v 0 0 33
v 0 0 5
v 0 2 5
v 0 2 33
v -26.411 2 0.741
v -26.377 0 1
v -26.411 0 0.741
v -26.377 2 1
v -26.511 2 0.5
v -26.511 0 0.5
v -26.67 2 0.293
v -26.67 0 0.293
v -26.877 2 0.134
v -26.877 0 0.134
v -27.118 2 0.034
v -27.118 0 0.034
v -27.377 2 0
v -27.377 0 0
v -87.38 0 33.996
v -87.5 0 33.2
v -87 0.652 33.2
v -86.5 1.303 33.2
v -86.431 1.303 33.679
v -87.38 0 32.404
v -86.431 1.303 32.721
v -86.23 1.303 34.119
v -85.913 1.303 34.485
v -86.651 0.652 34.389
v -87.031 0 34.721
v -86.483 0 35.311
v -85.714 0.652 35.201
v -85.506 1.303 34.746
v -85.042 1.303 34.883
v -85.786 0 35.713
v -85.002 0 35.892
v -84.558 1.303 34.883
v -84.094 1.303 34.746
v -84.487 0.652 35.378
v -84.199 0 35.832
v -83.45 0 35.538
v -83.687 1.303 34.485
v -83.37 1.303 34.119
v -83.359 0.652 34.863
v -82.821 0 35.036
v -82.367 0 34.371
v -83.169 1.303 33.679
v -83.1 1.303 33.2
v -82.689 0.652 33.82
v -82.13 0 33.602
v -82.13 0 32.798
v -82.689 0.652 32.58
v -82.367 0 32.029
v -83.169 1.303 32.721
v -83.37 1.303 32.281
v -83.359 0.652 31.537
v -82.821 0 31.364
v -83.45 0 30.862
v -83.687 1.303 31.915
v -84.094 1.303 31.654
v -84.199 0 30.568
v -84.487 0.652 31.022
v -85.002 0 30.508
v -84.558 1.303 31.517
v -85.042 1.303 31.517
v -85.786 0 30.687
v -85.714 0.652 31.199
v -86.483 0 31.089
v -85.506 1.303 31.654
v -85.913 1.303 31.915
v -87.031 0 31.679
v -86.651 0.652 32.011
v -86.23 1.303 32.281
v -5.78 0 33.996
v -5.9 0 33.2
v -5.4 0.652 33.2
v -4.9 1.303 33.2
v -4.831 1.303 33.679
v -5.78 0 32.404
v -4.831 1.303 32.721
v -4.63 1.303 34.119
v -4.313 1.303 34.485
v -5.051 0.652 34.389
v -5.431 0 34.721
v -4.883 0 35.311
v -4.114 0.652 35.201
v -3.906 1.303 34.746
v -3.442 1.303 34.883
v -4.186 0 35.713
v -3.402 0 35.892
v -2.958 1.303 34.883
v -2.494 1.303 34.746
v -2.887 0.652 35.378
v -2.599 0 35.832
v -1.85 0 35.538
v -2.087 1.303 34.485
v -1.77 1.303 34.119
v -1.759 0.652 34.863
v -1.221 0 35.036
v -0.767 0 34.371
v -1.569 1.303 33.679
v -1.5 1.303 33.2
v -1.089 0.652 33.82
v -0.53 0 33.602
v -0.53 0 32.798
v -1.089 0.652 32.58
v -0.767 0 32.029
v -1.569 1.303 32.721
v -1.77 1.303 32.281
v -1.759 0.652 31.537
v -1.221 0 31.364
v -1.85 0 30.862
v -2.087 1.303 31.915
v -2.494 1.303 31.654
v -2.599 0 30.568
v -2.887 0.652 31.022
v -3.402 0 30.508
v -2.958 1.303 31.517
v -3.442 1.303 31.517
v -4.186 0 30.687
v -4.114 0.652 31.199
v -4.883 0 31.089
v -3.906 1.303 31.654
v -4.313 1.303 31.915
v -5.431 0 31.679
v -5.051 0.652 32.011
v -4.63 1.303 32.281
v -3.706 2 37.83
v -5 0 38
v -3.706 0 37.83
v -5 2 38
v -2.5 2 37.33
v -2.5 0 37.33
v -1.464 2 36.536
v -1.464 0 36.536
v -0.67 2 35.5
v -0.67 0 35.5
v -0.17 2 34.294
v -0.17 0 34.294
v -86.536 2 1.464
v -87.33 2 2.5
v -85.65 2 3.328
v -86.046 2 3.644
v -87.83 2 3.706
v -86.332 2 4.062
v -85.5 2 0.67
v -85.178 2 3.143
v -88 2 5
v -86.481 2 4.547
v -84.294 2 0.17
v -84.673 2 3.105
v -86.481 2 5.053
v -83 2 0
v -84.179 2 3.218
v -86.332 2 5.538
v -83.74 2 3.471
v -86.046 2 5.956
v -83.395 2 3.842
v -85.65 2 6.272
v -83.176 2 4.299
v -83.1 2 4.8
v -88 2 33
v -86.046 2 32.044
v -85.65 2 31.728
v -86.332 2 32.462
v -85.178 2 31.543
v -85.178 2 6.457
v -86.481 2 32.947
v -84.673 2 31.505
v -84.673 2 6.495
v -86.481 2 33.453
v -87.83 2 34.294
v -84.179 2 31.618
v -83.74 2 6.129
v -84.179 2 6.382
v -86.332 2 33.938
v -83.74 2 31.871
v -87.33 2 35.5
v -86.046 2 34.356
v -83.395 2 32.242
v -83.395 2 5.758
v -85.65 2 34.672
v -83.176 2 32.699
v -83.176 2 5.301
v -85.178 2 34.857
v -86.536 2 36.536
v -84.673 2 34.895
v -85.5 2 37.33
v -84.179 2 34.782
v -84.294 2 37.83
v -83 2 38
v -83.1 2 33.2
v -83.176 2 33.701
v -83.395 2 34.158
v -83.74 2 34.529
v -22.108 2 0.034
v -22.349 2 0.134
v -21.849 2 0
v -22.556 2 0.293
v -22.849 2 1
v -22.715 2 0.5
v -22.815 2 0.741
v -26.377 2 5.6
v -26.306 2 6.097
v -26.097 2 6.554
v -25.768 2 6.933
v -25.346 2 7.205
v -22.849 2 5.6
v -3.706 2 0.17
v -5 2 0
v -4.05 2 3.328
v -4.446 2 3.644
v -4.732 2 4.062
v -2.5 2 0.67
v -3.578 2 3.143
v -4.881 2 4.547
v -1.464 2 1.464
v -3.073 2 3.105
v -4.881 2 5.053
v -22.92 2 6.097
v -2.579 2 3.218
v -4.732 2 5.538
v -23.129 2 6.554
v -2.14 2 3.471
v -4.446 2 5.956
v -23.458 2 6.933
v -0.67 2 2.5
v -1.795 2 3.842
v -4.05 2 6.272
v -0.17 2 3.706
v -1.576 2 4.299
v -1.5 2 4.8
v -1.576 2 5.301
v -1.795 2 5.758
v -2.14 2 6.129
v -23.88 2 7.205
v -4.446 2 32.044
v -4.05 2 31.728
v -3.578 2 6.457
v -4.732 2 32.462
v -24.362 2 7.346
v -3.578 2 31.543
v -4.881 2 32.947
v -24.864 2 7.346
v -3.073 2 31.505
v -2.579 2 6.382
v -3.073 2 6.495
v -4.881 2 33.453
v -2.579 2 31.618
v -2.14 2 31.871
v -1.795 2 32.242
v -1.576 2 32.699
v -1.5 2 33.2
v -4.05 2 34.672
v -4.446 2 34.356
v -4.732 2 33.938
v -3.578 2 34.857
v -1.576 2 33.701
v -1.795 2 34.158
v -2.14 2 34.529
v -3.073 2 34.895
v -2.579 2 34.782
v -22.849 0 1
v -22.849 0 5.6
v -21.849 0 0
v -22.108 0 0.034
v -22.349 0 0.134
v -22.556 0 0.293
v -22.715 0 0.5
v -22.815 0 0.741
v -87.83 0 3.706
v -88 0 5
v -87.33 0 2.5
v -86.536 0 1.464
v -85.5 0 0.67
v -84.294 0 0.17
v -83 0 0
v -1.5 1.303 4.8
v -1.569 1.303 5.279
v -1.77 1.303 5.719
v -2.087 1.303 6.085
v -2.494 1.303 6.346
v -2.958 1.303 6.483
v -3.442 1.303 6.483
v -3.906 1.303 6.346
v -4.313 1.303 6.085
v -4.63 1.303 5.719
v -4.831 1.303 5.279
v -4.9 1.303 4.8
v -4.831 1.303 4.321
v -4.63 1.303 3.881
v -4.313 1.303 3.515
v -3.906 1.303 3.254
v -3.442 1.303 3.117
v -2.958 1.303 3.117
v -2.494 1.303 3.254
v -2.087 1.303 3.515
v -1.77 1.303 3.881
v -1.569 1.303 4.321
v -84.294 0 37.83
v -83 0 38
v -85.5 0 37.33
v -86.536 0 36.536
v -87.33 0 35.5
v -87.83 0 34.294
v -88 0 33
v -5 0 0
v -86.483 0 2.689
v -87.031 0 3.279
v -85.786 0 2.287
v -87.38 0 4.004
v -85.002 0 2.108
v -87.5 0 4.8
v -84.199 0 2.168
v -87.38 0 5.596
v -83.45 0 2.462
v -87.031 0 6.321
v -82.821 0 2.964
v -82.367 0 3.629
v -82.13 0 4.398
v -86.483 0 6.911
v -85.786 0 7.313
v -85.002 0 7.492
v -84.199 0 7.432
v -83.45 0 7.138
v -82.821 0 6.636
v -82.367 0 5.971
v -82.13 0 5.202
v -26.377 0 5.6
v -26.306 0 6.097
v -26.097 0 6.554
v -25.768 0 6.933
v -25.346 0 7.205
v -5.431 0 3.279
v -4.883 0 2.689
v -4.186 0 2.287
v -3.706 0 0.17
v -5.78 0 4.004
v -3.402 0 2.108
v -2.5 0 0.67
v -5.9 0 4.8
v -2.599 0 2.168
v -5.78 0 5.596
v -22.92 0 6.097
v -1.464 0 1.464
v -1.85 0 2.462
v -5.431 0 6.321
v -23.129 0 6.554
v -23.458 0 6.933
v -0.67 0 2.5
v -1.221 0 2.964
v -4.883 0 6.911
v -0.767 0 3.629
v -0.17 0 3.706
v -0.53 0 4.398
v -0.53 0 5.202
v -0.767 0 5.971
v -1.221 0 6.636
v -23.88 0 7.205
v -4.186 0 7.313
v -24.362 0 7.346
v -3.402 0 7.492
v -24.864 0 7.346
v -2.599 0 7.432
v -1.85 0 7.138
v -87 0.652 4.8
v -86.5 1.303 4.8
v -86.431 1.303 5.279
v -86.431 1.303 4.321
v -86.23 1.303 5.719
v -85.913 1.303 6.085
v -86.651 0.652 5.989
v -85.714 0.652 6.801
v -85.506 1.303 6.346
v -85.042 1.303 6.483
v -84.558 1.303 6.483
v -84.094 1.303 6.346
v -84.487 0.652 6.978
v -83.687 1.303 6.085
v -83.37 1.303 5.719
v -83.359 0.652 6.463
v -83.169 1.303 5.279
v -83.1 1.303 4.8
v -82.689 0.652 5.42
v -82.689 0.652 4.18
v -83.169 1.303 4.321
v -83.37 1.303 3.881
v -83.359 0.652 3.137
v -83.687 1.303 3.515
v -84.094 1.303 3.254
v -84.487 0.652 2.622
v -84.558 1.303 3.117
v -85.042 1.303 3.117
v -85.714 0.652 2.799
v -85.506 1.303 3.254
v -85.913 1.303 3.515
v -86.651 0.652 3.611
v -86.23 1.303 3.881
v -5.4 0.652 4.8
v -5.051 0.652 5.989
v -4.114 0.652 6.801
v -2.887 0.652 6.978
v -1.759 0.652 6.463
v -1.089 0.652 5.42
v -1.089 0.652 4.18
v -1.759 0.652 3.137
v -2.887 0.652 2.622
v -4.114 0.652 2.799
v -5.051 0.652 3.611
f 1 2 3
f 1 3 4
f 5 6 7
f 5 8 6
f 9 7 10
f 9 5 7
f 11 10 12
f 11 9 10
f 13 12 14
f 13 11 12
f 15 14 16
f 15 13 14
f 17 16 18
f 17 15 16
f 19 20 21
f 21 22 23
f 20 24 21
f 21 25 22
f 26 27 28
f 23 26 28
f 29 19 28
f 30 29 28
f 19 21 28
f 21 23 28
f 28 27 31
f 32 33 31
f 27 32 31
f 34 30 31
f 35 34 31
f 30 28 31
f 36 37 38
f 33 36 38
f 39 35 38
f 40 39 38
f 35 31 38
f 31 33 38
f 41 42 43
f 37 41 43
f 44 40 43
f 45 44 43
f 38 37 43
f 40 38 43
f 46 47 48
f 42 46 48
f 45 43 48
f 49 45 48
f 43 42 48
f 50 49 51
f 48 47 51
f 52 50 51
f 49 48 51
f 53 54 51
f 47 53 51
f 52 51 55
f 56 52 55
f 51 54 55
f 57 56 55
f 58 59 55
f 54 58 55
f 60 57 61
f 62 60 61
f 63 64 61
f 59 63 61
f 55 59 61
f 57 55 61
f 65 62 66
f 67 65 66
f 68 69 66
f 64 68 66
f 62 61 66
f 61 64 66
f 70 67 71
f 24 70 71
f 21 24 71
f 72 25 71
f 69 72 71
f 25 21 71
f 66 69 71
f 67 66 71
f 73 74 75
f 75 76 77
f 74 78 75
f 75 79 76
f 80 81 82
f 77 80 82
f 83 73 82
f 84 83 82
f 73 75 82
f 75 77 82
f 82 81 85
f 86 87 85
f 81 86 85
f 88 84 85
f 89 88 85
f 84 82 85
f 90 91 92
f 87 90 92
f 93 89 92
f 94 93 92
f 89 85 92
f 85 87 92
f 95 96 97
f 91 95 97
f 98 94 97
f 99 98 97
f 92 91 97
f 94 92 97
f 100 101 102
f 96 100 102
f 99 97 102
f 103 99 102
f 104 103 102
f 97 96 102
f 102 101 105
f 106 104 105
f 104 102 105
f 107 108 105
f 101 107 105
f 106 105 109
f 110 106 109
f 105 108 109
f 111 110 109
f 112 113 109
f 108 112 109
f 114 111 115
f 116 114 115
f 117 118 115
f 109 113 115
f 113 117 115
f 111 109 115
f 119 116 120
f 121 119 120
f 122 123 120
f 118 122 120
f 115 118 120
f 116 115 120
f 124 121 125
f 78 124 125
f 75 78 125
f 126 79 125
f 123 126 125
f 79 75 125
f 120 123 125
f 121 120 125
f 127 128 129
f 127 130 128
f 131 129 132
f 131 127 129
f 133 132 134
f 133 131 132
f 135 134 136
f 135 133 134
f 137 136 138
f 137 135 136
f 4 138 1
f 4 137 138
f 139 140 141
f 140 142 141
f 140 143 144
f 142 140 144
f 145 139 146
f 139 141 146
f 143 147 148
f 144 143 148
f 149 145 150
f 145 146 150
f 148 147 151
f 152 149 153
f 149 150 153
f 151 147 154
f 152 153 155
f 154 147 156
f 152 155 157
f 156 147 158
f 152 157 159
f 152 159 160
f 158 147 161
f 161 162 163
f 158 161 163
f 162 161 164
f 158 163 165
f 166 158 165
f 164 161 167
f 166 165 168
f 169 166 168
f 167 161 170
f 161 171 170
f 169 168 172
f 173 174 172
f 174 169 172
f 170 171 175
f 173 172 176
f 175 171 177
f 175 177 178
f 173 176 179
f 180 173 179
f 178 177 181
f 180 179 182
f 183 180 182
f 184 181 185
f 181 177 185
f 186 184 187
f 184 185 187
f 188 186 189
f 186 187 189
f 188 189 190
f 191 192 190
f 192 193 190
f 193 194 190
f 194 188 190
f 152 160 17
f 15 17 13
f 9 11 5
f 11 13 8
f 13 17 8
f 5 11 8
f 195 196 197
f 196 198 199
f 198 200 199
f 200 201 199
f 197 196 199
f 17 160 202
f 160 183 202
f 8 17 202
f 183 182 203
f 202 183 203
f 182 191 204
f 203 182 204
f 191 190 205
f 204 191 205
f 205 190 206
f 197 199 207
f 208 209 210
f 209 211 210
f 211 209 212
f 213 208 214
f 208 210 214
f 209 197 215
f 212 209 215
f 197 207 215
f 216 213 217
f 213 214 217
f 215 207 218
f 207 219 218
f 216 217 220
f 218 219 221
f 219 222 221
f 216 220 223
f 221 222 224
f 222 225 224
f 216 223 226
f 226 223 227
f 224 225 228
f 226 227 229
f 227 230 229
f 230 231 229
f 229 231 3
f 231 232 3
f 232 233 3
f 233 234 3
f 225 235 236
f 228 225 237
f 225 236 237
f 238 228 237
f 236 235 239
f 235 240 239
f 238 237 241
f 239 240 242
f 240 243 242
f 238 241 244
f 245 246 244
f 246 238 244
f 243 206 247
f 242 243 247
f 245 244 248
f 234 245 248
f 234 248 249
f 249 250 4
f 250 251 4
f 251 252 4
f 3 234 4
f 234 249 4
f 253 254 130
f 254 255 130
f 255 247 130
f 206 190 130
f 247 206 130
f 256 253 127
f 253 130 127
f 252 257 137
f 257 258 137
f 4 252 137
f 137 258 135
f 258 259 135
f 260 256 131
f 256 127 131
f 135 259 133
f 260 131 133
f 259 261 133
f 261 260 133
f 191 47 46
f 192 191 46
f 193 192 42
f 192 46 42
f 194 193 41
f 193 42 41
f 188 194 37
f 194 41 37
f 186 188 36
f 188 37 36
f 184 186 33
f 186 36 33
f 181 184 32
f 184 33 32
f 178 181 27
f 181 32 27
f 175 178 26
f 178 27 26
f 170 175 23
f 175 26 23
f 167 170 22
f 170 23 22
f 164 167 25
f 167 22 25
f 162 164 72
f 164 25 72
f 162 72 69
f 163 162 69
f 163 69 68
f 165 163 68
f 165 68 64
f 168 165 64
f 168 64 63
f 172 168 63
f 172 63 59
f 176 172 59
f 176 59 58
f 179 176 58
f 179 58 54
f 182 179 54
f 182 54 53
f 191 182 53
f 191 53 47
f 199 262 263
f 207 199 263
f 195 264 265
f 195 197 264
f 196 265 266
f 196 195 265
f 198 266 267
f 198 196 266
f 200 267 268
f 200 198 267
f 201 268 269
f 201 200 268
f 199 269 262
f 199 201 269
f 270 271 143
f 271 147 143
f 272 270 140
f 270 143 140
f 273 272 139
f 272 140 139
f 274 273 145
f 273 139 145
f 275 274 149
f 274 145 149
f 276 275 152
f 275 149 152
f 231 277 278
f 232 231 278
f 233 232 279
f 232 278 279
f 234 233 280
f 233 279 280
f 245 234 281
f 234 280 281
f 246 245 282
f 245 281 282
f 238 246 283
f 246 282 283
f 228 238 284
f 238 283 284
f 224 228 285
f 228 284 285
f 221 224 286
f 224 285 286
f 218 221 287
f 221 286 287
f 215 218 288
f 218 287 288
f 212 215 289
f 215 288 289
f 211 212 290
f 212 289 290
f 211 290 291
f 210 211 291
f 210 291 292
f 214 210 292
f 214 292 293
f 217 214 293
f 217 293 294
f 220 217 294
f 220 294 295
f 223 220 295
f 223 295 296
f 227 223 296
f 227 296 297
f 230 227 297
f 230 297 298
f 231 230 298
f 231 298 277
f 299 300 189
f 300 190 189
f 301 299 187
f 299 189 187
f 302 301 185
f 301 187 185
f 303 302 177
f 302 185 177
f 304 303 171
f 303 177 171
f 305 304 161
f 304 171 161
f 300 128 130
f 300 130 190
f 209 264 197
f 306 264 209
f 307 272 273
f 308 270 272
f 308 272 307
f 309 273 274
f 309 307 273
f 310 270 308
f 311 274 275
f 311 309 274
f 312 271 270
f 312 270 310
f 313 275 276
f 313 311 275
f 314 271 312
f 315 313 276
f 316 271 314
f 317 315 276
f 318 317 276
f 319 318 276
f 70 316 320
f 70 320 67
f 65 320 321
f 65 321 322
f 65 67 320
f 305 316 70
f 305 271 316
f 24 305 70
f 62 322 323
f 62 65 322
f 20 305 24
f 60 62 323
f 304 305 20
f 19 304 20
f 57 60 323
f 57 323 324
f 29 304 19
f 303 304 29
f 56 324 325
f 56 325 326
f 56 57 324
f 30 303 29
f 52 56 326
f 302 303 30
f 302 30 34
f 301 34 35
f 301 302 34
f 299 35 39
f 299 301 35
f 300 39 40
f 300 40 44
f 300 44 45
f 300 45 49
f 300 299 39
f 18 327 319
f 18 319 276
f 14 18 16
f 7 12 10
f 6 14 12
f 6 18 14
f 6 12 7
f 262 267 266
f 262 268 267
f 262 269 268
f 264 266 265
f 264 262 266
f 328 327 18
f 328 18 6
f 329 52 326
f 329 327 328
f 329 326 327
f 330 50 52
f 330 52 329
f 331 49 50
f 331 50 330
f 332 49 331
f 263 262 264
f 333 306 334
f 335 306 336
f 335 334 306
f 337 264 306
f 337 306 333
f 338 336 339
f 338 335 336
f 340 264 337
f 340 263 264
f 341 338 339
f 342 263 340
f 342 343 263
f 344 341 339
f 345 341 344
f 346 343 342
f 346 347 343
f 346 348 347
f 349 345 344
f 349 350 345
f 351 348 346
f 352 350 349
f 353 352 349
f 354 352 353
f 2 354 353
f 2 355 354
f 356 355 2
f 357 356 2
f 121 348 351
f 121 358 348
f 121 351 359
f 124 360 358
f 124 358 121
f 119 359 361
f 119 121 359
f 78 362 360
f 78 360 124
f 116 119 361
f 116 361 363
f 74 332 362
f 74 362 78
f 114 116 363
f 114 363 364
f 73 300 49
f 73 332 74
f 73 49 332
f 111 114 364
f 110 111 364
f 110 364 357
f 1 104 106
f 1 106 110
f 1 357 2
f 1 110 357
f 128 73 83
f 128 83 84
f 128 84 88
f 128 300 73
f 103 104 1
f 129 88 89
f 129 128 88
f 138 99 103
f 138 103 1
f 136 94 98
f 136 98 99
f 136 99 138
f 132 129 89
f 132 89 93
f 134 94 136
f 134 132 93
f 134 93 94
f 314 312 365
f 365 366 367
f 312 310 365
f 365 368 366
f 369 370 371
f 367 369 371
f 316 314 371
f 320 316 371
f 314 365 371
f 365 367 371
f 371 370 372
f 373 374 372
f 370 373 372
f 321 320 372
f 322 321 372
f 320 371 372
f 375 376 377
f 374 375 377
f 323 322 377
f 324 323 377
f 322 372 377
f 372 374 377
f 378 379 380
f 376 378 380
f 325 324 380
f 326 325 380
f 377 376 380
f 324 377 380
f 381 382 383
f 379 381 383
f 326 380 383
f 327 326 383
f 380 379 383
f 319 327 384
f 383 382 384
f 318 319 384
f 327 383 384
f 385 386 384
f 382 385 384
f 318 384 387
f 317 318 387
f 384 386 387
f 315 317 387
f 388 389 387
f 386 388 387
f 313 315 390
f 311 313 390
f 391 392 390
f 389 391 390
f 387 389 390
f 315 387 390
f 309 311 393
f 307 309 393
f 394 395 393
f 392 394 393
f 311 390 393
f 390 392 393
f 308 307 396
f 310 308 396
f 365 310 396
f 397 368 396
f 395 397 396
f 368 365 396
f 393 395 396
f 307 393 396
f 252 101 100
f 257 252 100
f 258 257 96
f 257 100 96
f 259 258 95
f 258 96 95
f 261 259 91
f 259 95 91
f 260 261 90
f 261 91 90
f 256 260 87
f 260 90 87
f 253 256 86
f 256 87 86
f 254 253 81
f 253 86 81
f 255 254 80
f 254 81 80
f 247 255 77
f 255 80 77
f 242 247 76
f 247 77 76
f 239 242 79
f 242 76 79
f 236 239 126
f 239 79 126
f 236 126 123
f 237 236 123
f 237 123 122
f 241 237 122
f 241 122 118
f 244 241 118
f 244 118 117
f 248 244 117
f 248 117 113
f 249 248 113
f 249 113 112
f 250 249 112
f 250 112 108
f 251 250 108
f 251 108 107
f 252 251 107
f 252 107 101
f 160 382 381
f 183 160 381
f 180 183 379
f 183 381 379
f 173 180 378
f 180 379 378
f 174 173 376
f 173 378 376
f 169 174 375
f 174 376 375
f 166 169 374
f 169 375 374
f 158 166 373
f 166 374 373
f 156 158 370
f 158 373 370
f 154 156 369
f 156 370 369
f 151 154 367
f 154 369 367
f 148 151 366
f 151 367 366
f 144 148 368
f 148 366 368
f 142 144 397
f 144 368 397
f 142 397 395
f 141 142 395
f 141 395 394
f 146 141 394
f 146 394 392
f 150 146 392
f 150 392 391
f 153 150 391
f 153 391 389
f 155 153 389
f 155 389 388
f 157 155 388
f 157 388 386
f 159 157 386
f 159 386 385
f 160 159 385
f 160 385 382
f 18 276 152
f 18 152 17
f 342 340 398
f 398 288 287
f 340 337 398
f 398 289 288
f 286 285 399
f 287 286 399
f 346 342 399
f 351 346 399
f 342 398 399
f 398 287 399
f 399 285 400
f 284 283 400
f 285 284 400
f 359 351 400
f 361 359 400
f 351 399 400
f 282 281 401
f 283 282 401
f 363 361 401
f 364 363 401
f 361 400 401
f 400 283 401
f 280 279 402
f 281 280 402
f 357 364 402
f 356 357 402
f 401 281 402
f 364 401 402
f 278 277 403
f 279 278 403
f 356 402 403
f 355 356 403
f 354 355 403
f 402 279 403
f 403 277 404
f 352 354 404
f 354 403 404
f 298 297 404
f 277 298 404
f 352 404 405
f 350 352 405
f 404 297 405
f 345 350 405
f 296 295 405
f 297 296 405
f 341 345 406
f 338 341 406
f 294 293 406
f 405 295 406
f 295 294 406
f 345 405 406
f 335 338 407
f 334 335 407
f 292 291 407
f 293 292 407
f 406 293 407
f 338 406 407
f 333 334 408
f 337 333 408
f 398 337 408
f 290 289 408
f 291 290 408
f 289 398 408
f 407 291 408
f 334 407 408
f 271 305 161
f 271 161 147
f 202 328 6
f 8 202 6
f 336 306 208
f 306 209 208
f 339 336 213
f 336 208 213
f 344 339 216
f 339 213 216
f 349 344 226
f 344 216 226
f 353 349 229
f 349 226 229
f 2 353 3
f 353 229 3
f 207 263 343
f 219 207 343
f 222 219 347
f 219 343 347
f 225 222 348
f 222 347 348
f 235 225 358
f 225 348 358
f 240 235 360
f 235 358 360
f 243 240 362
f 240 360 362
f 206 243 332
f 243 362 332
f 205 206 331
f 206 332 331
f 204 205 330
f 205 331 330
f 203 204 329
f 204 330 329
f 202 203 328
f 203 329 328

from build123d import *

# Parameters (mm, degrees)
F0_R           = 1.7
F1_DEPTH       = 2
F2_R           = 5
F3_D           = 3
F3_DEPTH       = 13.5
F3_CSINK_D     = 5.4
F3_CSINK_ANGLE = 75
F4_DEPTH       = 25
F5_R           = 1


with BuildPart() as f1:
    # F0 (on Front) → F1 (new body)
    with BuildSketch(Plane.XZ):
        with BuildLine():
            Line((0, 38), (-88, 38))
            Line((-88, 38), (-88, 0))
            Line((-88, 0), (-26.377132, 0))
            Line((-26.377132, 0), (-26.377132, 5.6))
            ThreePointArc((-26.377132, 5.6), (-24.613067, 7.364066), (-22.849001, 5.6))
            Line((-22.849001, 5.6), (-22.849001, 0))
            Line((-22.849001, 0), (0, 0))
            Line((0, 0), (0, 38))
        make_face()
        with Locations((-84.8, 4.8)):
            Circle(F0_R, mode=Mode.SUBTRACT)
        with Locations((-3.2, 4.8)):
            Circle(F0_R, mode=Mode.SUBTRACT)
        with Locations((-84.8, 33.2)):
            Circle(F0_R, mode=Mode.SUBTRACT)
        with Locations((-3.2, 33.2)):
            Circle(F0_R, mode=Mode.SUBTRACT)
        with BuildLine():
            Line((-26.377132, 5.6), (-26.377132, 0))
            Line((-26.377132, 0), (-22.849001, 0))
            Line((-22.849001, 0), (-22.849001, 5.6))
            ThreePointArc((-22.849001, 5.6), (-24.613067, 7.364066), (-26.377132, 5.6))
        make_face()
    extrude(amount=-F1_DEPTH)

    # F2
    f2_edges = [f1.edges().sort_by_distance(p)[0] for p in [
        (-88, 1, 38),
        (-88, 1, 0),
        (0, 1, 0),
        (0, 1, 38),
    ]]
    fillet(f2_edges, radius=F2_R)

    # F3
    with Locations(Plane.XZ):
        with Locations((-84.8, 4.8), (-84.8, 33.2), (-3.2, 4.8), (-3.2, 33.2)):
            CounterSinkHole(F3_D / 2, F3_CSINK_D / 2, depth=F3_DEPTH, counter_sink_angle=F3_CSINK_ANGLE)

    # F0 (on Front) → F4 (cut)
    with BuildSketch(Plane.XZ):
        with BuildLine():
            Line((-26.377132, 5.6), (-26.377132, 0))
            Line((-26.377132, 0), (-22.849001, 0))
            Line((-22.849001, 0), (-22.849001, 5.6))
            ThreePointArc((-22.849001, 5.6), (-24.613067, 7.364066), (-26.377132, 5.6))
        make_face()
    extrude(amount=-F4_DEPTH, mode=Mode.SUBTRACT)

    # F5
    f5_edges = [f1.edges().sort_by_distance(p)[0] for p in [
        (-26.377132, 1, 0),
        (-22.849001, 1, 0),
    ]]
    fillet(f5_edges, radius=F5_R)


solid = f1.part
